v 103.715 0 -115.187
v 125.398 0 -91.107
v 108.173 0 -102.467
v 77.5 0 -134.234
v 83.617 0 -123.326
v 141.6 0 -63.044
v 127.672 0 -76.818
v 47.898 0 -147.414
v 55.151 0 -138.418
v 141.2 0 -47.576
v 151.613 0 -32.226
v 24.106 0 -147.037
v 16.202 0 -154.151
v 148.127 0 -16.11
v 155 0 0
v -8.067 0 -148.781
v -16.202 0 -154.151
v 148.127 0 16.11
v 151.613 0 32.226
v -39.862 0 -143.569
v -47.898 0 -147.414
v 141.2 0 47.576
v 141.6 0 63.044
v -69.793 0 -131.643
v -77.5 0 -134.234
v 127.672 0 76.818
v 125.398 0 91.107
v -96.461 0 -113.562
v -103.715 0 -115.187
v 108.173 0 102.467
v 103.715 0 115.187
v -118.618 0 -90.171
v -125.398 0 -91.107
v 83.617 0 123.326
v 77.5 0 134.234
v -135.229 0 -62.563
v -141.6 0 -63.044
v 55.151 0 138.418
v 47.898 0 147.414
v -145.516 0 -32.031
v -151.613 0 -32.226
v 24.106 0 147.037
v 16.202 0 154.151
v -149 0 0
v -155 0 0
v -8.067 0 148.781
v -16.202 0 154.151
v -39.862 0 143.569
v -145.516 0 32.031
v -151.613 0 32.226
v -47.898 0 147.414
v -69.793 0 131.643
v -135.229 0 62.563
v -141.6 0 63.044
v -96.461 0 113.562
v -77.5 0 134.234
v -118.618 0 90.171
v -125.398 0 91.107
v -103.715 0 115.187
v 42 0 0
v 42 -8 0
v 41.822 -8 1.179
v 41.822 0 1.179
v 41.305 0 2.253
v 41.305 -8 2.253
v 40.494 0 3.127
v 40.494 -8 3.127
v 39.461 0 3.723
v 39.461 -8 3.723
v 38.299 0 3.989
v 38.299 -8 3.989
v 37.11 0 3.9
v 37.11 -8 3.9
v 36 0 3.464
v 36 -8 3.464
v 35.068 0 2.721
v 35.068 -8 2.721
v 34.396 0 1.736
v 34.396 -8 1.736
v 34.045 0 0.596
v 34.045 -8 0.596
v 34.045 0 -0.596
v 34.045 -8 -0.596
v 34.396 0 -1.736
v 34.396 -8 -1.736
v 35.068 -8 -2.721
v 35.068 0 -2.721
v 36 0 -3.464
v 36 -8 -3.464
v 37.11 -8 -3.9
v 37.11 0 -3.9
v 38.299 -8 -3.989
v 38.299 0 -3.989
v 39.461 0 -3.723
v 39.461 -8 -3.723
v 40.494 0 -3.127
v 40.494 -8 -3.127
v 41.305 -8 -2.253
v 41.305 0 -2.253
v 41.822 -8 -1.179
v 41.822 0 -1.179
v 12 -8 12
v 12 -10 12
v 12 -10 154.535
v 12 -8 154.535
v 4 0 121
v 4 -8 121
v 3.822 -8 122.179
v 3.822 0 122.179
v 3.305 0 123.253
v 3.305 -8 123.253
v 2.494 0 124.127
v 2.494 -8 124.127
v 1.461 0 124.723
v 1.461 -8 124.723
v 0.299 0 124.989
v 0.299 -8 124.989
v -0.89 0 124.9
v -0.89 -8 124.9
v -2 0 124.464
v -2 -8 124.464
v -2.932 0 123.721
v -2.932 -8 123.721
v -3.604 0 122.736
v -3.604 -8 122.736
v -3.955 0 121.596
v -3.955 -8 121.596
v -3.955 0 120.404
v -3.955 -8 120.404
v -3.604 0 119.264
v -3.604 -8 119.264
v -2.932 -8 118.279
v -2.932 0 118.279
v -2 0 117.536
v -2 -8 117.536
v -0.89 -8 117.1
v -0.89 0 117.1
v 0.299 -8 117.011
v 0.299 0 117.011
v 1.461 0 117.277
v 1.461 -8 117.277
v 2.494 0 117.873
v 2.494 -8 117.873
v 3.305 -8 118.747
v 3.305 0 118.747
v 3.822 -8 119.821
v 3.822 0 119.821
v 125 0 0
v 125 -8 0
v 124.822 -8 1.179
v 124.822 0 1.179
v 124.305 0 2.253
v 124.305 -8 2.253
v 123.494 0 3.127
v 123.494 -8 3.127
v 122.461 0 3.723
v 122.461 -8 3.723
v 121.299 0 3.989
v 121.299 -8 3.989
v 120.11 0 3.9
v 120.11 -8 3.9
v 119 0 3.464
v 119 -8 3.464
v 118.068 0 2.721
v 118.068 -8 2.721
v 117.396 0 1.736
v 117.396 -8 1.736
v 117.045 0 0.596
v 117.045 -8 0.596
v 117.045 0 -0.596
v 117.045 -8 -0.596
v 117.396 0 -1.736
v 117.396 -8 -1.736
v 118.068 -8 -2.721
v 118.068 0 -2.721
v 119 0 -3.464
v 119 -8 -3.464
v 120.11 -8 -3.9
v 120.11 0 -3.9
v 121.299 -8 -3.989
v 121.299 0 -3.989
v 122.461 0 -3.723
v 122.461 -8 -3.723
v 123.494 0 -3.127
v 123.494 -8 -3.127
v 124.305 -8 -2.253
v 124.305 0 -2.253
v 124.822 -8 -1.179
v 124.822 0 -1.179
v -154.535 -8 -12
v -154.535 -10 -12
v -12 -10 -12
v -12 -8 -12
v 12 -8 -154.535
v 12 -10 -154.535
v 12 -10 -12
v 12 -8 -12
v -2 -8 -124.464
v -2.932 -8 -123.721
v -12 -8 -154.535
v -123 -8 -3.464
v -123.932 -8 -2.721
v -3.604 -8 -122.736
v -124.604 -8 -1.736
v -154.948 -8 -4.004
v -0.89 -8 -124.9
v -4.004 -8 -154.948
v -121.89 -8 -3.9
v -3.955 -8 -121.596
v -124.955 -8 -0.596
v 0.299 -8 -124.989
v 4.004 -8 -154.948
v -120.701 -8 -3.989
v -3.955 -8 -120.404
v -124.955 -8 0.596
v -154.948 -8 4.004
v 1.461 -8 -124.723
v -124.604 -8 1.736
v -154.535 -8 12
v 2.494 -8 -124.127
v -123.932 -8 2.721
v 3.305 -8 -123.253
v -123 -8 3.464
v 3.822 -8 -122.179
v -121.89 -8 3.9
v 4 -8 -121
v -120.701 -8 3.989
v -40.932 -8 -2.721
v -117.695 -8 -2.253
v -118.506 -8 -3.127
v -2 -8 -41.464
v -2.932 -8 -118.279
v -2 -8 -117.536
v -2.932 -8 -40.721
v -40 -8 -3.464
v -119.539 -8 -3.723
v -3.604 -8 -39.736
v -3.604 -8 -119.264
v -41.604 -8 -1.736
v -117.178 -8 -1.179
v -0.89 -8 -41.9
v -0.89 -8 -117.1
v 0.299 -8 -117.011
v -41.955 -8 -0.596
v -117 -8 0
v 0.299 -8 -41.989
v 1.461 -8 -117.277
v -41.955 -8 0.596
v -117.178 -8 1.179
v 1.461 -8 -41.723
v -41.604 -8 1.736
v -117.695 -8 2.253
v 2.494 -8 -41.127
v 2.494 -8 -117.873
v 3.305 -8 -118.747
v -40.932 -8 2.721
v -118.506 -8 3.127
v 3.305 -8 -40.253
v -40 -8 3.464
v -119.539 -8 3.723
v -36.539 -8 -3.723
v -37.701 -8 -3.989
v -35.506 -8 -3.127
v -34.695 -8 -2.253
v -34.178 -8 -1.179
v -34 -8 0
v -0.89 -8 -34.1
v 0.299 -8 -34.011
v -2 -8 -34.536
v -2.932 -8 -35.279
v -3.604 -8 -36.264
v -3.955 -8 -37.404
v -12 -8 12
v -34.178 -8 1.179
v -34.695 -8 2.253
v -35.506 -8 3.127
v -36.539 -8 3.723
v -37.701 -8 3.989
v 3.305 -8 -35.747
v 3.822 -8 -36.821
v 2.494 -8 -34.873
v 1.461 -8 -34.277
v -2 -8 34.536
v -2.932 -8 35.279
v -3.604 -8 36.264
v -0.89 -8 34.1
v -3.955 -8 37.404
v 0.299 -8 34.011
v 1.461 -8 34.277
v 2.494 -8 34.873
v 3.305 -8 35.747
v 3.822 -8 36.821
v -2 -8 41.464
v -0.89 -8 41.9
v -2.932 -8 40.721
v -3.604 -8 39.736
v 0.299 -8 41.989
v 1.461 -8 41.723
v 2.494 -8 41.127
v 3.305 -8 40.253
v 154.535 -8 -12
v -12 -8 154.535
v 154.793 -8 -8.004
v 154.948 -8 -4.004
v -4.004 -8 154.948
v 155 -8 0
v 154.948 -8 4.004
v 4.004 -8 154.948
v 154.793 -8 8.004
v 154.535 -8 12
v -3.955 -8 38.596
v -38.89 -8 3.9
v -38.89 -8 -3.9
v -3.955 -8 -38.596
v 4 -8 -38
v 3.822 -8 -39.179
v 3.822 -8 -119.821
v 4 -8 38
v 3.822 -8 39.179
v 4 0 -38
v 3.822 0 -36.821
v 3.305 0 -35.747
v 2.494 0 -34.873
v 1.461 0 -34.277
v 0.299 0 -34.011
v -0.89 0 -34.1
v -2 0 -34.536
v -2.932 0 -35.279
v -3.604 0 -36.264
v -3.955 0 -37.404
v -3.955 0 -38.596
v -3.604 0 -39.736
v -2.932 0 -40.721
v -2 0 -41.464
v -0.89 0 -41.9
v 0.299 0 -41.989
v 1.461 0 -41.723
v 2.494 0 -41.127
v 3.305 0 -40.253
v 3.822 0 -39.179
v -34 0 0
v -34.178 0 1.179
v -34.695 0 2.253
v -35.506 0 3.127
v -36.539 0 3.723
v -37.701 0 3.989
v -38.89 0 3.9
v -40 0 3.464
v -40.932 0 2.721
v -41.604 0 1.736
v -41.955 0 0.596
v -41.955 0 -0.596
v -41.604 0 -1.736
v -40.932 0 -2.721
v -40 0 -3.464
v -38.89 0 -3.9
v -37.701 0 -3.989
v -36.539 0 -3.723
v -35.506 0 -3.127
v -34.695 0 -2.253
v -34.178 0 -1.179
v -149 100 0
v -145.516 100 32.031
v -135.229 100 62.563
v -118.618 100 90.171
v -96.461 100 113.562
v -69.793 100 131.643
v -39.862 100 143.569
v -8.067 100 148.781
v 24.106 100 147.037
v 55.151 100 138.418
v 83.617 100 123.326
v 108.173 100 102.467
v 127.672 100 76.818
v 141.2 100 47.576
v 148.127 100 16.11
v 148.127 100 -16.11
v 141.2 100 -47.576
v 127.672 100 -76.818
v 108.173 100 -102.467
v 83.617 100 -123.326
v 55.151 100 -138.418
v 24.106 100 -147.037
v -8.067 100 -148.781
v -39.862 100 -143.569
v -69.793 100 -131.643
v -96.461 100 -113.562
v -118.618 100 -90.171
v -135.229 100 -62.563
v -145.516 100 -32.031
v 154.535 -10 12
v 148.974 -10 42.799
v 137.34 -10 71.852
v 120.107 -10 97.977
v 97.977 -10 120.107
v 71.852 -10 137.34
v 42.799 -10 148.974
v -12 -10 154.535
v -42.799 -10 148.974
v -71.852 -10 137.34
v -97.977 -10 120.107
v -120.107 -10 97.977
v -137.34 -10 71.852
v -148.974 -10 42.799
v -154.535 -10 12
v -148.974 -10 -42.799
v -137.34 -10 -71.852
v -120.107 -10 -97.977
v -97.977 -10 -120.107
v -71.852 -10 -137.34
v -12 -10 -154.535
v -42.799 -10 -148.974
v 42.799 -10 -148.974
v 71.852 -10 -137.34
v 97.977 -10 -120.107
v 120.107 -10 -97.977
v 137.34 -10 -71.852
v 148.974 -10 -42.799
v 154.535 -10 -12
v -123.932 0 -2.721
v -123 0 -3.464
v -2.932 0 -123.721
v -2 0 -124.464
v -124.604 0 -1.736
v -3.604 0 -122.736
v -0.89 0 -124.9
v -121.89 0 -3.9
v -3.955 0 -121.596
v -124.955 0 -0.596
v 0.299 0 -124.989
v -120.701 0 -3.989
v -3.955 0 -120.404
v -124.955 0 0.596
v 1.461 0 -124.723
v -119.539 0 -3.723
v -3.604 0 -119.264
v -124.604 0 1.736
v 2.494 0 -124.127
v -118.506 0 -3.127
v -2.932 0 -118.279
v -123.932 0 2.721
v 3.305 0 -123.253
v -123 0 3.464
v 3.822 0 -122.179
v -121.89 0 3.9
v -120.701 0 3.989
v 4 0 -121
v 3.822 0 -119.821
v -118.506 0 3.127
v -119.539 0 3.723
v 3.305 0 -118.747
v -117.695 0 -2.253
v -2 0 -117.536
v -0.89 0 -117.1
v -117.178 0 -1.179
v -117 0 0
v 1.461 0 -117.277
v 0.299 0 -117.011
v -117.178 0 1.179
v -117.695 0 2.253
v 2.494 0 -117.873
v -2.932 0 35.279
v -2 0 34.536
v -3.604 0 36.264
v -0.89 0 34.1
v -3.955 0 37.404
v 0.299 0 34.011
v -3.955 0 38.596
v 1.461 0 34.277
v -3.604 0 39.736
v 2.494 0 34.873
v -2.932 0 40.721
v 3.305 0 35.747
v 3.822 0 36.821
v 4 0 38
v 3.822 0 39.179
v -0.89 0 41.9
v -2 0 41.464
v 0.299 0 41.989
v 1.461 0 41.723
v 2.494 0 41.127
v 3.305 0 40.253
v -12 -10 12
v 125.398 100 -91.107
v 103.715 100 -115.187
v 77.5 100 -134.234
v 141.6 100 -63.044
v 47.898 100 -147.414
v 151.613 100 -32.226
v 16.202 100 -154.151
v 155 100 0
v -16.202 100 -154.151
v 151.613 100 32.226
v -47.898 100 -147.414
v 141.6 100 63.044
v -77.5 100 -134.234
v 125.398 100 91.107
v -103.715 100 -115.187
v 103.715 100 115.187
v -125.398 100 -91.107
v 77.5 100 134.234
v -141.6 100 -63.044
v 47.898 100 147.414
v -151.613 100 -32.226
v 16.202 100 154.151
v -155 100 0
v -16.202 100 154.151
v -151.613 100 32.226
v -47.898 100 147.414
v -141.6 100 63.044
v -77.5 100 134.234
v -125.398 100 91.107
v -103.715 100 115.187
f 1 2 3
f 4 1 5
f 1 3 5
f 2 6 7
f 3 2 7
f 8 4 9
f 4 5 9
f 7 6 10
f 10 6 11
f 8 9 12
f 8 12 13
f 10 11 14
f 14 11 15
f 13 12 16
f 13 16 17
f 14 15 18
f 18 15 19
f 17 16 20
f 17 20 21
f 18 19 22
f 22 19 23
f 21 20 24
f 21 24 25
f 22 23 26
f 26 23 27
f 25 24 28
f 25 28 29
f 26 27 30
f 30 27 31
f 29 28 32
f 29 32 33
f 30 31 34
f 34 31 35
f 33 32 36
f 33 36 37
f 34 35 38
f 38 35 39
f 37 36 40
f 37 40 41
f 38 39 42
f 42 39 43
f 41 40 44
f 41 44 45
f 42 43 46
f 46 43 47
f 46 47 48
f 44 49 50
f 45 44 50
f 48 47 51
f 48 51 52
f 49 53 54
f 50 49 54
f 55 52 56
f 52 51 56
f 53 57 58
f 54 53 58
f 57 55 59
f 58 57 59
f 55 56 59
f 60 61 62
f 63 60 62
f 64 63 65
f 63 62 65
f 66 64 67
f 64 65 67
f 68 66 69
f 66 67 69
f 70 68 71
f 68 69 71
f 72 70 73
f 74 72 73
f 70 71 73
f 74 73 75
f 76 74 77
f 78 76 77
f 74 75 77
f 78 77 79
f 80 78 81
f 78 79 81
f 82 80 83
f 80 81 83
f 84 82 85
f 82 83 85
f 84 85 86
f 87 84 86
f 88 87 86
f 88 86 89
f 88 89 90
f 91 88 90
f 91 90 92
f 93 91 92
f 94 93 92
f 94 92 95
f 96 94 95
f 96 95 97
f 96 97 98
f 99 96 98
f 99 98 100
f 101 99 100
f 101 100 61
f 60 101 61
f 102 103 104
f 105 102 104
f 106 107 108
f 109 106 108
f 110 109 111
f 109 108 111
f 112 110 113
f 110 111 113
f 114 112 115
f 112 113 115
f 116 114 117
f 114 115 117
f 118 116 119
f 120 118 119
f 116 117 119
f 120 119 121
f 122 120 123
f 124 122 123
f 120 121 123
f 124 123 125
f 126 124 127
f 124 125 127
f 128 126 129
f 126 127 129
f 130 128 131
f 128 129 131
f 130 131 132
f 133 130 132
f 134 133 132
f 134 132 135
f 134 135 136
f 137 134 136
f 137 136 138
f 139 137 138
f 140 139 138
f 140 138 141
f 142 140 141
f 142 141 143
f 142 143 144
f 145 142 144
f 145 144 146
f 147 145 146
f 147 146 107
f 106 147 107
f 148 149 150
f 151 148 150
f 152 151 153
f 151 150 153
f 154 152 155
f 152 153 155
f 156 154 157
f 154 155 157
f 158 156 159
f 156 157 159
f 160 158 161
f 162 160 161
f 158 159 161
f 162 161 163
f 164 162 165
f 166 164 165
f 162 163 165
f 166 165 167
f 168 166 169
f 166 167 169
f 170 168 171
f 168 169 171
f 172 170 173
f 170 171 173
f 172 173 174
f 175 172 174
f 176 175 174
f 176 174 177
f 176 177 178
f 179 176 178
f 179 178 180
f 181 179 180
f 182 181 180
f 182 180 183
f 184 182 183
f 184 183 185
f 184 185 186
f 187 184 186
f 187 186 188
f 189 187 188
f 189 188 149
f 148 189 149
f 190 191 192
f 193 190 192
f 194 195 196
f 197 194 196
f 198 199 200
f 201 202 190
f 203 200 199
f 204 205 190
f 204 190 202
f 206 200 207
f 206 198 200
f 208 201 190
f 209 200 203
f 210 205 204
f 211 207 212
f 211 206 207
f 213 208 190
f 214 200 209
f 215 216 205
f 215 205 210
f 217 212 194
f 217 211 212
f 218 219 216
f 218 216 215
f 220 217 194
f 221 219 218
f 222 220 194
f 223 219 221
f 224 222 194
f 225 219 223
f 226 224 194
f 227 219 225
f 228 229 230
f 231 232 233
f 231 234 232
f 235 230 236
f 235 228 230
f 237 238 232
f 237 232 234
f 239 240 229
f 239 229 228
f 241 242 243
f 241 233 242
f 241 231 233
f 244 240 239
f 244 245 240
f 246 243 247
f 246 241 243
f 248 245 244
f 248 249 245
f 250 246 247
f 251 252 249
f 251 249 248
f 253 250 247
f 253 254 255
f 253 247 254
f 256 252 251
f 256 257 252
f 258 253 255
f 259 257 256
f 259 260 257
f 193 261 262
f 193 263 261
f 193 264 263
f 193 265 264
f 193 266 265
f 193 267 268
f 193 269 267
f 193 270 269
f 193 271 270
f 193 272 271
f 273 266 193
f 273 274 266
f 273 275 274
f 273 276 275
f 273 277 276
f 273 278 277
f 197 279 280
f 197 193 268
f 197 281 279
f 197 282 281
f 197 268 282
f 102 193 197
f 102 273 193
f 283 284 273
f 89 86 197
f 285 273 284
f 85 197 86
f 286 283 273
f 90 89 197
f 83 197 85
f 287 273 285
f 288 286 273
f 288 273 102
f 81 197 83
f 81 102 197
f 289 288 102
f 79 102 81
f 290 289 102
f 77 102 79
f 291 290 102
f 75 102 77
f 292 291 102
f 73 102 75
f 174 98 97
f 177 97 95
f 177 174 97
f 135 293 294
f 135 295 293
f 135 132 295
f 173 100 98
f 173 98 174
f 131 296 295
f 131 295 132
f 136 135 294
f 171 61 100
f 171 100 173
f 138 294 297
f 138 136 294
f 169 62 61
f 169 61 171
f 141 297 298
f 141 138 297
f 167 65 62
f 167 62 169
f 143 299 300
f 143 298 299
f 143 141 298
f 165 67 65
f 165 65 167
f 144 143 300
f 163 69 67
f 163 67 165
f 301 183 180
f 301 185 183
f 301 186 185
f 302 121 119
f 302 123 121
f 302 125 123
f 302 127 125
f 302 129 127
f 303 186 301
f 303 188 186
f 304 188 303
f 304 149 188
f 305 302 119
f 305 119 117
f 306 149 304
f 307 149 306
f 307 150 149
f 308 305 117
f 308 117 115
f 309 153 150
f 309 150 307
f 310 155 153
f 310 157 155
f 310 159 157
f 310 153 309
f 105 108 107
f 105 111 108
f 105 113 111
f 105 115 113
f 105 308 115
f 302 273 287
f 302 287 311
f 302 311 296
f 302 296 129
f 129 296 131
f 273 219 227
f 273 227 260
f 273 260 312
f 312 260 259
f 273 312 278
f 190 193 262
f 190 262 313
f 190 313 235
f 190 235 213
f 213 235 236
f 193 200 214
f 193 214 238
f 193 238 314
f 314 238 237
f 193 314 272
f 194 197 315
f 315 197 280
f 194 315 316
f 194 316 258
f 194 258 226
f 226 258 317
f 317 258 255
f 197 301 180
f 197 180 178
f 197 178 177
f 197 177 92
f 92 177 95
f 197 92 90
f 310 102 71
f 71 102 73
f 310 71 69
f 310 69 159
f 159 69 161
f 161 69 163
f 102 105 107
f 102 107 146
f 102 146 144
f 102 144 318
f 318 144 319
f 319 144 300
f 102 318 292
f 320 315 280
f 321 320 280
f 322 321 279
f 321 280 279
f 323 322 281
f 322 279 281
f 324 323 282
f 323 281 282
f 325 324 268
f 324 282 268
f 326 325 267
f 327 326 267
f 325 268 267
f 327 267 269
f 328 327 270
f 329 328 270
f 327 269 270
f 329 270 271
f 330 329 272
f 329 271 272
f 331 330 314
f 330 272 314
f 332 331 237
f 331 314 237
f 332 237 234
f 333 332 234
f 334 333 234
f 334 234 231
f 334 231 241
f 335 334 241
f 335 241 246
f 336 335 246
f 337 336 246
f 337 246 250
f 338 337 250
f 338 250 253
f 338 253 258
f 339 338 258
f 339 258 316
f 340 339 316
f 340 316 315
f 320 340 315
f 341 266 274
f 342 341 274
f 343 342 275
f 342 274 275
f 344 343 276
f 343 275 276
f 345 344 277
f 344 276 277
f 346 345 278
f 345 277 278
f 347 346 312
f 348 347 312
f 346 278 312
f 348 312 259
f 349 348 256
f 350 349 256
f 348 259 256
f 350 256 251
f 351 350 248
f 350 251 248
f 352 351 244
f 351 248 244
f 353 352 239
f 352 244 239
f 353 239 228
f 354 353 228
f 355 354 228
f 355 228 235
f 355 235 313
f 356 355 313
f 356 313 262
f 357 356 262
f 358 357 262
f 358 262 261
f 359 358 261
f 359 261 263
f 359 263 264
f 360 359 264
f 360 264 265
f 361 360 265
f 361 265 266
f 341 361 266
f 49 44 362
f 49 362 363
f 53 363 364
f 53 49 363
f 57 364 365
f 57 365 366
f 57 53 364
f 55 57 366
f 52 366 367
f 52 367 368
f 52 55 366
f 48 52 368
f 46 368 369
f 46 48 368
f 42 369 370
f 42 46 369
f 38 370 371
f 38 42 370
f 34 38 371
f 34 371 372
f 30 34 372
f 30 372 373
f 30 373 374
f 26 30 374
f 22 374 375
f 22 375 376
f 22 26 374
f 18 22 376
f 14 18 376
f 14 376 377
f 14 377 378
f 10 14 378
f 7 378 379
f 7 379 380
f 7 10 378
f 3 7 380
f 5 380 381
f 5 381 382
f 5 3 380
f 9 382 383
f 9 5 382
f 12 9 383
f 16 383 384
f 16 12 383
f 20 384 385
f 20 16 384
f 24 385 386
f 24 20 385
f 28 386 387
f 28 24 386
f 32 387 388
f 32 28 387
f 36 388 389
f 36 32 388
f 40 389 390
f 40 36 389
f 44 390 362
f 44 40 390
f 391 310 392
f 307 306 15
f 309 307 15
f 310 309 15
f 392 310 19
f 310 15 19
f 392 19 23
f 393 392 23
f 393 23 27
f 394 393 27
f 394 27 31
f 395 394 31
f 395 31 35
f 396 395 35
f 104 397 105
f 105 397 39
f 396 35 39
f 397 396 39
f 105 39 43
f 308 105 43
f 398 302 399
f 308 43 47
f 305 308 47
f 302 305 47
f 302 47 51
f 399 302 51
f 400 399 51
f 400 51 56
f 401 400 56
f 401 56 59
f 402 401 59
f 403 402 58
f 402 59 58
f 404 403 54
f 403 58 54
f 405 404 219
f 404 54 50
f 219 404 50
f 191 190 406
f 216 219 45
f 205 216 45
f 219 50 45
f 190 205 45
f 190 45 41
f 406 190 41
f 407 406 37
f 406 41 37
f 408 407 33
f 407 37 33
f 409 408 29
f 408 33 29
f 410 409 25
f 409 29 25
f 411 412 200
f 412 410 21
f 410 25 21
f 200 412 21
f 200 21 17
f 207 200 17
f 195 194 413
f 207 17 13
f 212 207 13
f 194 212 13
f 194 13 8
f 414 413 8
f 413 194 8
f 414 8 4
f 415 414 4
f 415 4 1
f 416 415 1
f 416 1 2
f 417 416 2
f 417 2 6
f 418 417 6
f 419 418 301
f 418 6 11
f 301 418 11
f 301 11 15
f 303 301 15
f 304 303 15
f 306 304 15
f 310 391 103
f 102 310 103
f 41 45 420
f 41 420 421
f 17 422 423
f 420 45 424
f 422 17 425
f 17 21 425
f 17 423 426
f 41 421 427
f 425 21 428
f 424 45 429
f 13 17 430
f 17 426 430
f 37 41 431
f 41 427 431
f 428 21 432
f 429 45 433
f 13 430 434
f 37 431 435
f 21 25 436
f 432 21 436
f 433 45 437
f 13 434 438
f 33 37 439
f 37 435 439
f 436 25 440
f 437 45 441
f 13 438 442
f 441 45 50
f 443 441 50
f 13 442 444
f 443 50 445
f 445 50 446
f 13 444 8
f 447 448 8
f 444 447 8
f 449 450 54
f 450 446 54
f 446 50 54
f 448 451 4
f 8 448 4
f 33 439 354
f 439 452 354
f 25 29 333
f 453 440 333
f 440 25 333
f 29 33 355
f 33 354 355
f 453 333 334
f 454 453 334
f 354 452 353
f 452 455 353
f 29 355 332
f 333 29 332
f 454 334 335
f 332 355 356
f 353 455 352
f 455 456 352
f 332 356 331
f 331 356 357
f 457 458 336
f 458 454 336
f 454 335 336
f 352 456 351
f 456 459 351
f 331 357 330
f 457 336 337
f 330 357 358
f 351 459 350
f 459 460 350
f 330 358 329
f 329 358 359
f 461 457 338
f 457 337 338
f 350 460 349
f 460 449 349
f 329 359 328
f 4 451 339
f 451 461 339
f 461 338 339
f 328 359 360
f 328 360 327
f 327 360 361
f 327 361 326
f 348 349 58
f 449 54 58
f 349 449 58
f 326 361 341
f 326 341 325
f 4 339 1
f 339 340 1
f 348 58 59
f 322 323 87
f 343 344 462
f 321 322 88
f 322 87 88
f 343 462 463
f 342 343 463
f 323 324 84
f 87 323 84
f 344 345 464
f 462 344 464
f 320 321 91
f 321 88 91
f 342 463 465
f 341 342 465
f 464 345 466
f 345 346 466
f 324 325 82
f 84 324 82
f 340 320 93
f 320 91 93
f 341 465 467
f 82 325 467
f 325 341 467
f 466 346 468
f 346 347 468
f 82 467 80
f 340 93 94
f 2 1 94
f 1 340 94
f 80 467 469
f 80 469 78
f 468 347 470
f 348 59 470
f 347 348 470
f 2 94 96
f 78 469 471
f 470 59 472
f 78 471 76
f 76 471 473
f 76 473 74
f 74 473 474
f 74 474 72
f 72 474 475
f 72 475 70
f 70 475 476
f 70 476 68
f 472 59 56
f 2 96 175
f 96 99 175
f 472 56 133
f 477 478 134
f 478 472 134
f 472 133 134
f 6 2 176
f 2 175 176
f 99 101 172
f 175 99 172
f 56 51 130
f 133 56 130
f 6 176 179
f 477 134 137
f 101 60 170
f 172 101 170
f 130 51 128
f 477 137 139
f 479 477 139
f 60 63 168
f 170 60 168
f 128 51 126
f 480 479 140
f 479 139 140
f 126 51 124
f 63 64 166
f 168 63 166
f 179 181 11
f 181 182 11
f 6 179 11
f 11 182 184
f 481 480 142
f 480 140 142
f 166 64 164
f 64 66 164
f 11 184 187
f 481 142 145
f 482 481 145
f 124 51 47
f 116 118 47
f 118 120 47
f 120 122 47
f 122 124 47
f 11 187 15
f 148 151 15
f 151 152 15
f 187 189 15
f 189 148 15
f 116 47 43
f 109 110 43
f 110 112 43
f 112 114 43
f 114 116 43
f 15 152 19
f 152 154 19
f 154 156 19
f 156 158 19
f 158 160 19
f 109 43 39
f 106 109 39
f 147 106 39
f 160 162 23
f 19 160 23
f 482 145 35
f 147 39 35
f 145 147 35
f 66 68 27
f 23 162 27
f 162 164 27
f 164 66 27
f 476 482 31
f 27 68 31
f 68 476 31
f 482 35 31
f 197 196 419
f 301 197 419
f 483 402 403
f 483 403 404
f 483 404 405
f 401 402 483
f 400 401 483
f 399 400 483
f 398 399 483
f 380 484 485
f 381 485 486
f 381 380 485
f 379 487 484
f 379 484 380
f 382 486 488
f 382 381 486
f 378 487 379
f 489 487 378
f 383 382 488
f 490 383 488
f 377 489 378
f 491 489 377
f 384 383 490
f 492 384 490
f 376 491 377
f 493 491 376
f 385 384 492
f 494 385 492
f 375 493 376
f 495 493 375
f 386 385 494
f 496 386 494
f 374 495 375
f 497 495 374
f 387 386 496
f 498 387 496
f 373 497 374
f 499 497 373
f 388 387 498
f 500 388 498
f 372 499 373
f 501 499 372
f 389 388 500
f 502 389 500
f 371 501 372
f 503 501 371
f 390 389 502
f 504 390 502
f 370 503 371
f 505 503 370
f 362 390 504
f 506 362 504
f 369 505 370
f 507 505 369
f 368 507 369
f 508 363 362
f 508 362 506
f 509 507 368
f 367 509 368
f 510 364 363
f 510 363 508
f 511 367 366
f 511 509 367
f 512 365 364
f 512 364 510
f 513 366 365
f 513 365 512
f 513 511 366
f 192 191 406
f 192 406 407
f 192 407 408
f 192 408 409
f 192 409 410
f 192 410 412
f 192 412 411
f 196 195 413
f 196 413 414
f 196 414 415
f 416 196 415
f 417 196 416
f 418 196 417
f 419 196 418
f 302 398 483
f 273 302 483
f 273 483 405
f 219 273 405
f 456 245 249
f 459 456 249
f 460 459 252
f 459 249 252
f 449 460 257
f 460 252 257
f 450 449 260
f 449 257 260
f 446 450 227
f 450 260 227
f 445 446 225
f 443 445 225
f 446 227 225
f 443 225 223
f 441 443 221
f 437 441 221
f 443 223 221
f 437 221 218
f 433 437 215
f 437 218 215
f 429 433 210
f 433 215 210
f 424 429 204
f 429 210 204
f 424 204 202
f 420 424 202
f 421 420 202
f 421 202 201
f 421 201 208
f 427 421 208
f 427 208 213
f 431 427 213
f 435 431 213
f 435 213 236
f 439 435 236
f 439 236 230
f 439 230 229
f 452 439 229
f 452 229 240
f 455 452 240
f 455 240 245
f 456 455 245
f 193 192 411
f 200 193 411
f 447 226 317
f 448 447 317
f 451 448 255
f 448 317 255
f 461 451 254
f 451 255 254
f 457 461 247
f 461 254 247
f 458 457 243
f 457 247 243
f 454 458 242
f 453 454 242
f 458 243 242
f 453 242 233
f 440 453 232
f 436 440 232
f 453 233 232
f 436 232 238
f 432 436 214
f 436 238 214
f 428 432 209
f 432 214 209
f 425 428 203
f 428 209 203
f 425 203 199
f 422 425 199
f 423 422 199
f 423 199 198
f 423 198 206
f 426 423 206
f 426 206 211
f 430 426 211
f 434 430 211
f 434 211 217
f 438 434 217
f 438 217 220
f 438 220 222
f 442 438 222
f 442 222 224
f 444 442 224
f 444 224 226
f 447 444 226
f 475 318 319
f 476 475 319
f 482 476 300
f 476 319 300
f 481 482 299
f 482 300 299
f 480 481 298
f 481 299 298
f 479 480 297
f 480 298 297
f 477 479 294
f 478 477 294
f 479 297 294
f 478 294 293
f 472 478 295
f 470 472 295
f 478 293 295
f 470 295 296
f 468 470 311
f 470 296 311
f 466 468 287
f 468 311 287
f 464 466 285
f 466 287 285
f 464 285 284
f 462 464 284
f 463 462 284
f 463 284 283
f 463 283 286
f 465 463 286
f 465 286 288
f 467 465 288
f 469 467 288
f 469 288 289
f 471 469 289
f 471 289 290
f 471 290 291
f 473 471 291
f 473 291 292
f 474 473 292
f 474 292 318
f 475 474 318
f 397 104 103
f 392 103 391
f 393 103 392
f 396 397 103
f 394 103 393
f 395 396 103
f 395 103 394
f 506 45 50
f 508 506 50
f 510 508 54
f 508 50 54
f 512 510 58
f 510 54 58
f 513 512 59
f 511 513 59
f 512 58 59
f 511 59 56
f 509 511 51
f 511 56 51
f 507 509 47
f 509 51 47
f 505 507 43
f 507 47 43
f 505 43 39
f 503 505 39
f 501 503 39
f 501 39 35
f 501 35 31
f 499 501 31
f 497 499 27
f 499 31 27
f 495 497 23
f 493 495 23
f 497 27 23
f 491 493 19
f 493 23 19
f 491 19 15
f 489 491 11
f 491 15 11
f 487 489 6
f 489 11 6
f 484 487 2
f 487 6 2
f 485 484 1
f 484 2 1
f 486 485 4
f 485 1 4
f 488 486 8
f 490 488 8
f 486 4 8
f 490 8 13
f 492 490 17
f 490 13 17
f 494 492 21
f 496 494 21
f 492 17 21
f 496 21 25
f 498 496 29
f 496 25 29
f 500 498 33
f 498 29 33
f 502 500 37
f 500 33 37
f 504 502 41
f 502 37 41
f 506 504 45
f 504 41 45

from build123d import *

# Parameters (mm, degrees)
F0_R     = 155
F1_DEPTH = 10
F2_R     = 155
F2_R_2   = 149
F3_DEPTH = 100
F5_DEPTH = 2
F6_R     = 4
F7_DEPTH = 108.001


with BuildPart() as f1:
    # F0 (on Front) → F1 (new body)
    with BuildSketch(Plane.XZ):
        Circle(F0_R)
    extrude(amount=F1_DEPTH)

    # F4 (on face) → F5 (cut)
    with BuildSketch(Plane.XZ.offset(10)):
        with BuildLine():
            Line((-12, 154.534786), (-12, 12))
            Line((-12, 12), (-154.534786, 12))
            ThreePointArc((-154.534786, 12), (-155, 0), (-154.534786, -12))
            Line((-154.534786, -12), (-12, -12))
            Line((-12, -12), (-12, -154.534786))
            ThreePointArc((-12, -154.534786), (0, -155), (12, -154.534786))
            Line((12, -154.534786), (12, -12))
            Line((12, -12), (154.534786, -12))
            ThreePointArc((154.534786, -12), (155, 0), (154.534786, 12))
            Line((154.534786, 12), (12, 12))
            Line((12, 12), (12, 154.534786))
            ThreePointArc((12, 154.534786), (0, 155), (-12, 154.534786))
        make_face()
    extrude(amount=-F5_DEPTH, mode=Mode.SUBTRACT)

    # F6 (on face) → F7 (cut, through all)
    with BuildSketch(Plane.XZ.offset(8)):
        with Locations((0, 121)):
            Circle(F6_R)
        with Locations((0, 38)):
            Circle(F6_R)
        with Locations((-121, 0)):
            Circle(F6_R)
        with Locations((-38, 0)):
            Circle(F6_R)
        with Locations((0, -121)):
            Circle(F6_R)
        with Locations((0, -38)):
            Circle(F6_R)
        with Locations((121, 0)):
            Circle(F6_R)
        with Locations((38, 0)):
            Circle(F6_R)
    extrude(amount=-F7_DEPTH, mode=Mode.SUBTRACT)


with BuildPart() as f3:
    # F2 (on face) → F3 (new body)
    with BuildSketch(Plane(origin=(0, 0, 0), x_dir=(-1, 0, 0), z_dir=(0, 1, 0))):
        Circle(F2_R)
        Circle(F2_R_2, mode=Mode.SUBTRACT)
    extrude(amount=F3_DEPTH)


solid = Compound([f1.part, f3.part])
